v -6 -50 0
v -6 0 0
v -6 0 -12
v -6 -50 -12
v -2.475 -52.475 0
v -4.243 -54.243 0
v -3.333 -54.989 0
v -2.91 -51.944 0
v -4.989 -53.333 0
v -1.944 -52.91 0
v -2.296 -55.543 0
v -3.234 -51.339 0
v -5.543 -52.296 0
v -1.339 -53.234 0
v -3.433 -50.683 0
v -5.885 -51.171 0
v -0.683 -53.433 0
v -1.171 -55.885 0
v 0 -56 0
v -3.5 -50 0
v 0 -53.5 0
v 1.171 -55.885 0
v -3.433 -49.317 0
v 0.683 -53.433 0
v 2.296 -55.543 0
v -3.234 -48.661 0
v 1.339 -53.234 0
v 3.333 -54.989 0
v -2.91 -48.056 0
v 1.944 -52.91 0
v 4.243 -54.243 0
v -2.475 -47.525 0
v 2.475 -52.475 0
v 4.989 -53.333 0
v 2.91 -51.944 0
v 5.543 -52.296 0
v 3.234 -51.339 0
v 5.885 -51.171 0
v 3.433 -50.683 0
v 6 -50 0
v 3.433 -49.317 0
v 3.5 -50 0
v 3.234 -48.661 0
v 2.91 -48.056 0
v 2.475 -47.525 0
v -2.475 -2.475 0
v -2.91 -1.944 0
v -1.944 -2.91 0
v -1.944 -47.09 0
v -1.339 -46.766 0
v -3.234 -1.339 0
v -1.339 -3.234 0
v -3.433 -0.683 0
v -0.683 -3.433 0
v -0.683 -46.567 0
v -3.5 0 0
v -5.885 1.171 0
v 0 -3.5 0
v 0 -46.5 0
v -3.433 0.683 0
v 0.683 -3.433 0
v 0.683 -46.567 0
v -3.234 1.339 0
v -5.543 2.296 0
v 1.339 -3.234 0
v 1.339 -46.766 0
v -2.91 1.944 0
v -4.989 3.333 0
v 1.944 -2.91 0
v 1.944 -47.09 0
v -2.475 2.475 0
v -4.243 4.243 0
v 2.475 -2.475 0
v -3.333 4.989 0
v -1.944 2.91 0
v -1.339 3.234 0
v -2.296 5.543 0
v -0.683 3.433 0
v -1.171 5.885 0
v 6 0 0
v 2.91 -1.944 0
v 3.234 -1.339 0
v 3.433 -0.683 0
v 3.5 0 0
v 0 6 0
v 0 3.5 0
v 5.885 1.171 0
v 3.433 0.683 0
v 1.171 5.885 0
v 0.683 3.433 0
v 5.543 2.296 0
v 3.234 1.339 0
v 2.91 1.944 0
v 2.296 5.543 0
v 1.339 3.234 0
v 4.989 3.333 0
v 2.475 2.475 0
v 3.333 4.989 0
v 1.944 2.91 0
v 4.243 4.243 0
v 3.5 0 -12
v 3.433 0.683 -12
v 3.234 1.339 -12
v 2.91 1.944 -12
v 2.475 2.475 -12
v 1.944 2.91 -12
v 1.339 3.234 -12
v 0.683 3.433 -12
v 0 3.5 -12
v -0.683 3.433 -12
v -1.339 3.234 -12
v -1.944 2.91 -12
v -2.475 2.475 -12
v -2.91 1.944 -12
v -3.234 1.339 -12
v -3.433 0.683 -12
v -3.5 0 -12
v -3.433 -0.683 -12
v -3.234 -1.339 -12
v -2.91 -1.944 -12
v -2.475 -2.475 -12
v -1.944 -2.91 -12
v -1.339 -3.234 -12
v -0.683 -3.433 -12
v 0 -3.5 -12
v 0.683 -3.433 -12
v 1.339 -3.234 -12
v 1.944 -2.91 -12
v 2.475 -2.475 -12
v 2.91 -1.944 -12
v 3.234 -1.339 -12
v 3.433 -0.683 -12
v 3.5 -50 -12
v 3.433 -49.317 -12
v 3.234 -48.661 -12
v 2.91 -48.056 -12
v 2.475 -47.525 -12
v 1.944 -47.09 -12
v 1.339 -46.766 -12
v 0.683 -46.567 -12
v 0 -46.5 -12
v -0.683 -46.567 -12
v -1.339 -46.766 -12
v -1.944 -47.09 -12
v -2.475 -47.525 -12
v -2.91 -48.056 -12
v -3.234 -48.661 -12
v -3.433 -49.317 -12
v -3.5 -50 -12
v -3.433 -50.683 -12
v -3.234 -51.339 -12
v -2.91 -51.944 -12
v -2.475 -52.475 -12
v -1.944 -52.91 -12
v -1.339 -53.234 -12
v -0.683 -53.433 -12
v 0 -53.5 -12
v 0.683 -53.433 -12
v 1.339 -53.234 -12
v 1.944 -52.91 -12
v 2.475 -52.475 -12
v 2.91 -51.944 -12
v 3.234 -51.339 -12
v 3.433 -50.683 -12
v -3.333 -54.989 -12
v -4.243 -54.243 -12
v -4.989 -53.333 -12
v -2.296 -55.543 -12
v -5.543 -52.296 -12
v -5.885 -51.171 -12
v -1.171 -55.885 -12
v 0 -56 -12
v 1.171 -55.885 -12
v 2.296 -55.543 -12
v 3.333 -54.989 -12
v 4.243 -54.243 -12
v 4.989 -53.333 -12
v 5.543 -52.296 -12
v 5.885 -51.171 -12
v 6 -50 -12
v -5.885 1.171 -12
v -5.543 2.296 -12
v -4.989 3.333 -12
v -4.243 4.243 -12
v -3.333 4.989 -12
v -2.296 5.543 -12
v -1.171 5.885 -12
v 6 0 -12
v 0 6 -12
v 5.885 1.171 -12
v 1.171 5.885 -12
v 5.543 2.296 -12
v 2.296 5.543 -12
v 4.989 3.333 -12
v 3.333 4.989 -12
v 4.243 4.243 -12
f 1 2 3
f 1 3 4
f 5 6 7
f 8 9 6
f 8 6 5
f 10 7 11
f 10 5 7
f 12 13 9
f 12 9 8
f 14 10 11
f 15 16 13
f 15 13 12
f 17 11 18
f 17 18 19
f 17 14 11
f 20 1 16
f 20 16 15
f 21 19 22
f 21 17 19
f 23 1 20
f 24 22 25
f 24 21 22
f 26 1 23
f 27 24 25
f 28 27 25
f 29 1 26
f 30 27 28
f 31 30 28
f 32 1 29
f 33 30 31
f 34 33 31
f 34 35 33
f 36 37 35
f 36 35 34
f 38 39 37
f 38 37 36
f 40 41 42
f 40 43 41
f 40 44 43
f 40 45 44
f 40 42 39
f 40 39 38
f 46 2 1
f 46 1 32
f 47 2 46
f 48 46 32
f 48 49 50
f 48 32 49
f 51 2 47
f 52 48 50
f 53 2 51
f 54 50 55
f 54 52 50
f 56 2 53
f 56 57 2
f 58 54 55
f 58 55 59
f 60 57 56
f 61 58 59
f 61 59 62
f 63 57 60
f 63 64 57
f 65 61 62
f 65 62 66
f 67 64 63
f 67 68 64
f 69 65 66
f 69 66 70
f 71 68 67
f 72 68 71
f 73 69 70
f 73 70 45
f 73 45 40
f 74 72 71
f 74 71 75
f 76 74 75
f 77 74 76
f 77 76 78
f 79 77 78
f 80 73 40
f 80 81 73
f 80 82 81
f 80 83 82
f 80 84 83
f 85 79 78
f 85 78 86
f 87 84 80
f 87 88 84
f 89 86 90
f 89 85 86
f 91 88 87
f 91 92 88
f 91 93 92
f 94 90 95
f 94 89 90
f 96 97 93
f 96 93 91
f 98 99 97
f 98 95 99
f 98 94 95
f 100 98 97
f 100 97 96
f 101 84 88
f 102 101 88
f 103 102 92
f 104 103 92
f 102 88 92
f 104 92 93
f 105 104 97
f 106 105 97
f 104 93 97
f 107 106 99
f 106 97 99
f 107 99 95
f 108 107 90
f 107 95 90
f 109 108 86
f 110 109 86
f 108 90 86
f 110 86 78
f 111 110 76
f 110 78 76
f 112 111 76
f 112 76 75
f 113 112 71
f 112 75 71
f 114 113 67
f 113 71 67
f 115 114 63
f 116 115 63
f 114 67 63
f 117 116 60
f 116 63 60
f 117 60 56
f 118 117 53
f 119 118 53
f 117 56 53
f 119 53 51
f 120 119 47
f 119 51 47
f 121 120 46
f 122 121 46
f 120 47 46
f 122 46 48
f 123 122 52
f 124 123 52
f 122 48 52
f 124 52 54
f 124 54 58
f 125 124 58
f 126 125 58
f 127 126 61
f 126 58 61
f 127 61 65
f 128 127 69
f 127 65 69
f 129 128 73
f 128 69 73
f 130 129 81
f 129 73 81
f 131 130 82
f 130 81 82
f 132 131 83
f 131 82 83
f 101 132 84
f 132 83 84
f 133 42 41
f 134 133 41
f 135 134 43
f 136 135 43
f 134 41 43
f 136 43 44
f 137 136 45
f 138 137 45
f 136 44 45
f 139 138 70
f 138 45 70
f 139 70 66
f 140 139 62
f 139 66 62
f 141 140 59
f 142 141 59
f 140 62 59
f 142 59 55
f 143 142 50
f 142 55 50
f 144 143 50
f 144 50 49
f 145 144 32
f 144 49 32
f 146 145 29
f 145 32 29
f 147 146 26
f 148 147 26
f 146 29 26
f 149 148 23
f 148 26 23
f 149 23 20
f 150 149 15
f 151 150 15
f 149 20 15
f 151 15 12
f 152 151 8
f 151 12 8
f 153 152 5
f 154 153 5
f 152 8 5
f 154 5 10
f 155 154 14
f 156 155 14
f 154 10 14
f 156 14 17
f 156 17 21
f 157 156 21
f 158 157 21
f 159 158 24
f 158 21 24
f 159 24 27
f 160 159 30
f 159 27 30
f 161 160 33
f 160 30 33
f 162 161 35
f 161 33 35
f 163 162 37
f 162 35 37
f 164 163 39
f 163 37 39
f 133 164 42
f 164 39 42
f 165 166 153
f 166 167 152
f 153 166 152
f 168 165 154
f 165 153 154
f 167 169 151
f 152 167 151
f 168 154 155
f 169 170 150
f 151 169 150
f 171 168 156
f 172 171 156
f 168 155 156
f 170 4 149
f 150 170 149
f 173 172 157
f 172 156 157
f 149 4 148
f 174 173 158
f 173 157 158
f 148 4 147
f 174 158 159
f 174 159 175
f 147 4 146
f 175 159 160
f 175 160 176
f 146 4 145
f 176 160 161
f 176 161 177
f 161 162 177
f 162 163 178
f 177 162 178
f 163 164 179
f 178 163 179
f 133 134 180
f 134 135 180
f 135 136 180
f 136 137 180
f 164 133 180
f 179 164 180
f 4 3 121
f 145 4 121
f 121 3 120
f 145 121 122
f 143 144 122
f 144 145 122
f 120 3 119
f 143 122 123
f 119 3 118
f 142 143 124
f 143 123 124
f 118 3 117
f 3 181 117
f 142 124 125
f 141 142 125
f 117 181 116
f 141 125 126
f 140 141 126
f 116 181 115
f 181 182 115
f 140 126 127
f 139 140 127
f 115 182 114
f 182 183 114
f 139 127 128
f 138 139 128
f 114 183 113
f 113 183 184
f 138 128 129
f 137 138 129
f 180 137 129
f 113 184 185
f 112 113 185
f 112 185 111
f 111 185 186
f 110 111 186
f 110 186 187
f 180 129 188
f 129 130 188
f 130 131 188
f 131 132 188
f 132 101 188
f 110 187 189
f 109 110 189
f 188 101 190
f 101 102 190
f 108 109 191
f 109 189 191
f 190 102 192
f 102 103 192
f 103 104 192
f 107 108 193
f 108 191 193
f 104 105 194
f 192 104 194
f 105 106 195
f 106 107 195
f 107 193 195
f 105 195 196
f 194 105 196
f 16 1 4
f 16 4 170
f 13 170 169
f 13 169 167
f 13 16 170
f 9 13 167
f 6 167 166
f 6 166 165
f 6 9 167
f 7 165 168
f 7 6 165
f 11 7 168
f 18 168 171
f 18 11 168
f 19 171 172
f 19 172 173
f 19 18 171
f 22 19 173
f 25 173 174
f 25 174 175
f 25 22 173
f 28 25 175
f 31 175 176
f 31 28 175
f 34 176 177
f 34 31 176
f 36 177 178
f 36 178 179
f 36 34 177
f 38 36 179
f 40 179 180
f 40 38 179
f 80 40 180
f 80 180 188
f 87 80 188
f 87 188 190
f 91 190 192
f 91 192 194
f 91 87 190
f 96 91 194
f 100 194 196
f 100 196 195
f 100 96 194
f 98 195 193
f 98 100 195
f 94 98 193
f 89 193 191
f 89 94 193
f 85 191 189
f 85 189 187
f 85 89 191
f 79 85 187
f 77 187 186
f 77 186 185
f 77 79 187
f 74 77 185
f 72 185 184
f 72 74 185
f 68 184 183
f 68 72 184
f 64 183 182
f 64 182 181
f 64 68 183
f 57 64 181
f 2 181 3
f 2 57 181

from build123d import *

# Parameters (mm, degrees)
SKETCH1_R           = 3.5
BOSS_EXTRUDE1_DEPTH = 12


with BuildPart() as part:
    # Sketch1 → Boss-Extrude1 (new body)
    with BuildSketch(Plane.XY):
        with BuildLine():
            Line((-6, 0), (-6, -50))
            ThreePointArc((-6, -50), (0, -56), (6, -50))
            Line((6, -50), (6, 0))
            ThreePointArc((6, 0), (0, 6), (-6, 0))
        make_face()
        Circle(SKETCH1_R, mode=Mode.SUBTRACT)
        with Locations((0, -50)):
            Circle(SKETCH1_R, mode=Mode.SUBTRACT)
    extrude(amount=-BOSS_EXTRUDE1_DEPTH)


solid = part.part
